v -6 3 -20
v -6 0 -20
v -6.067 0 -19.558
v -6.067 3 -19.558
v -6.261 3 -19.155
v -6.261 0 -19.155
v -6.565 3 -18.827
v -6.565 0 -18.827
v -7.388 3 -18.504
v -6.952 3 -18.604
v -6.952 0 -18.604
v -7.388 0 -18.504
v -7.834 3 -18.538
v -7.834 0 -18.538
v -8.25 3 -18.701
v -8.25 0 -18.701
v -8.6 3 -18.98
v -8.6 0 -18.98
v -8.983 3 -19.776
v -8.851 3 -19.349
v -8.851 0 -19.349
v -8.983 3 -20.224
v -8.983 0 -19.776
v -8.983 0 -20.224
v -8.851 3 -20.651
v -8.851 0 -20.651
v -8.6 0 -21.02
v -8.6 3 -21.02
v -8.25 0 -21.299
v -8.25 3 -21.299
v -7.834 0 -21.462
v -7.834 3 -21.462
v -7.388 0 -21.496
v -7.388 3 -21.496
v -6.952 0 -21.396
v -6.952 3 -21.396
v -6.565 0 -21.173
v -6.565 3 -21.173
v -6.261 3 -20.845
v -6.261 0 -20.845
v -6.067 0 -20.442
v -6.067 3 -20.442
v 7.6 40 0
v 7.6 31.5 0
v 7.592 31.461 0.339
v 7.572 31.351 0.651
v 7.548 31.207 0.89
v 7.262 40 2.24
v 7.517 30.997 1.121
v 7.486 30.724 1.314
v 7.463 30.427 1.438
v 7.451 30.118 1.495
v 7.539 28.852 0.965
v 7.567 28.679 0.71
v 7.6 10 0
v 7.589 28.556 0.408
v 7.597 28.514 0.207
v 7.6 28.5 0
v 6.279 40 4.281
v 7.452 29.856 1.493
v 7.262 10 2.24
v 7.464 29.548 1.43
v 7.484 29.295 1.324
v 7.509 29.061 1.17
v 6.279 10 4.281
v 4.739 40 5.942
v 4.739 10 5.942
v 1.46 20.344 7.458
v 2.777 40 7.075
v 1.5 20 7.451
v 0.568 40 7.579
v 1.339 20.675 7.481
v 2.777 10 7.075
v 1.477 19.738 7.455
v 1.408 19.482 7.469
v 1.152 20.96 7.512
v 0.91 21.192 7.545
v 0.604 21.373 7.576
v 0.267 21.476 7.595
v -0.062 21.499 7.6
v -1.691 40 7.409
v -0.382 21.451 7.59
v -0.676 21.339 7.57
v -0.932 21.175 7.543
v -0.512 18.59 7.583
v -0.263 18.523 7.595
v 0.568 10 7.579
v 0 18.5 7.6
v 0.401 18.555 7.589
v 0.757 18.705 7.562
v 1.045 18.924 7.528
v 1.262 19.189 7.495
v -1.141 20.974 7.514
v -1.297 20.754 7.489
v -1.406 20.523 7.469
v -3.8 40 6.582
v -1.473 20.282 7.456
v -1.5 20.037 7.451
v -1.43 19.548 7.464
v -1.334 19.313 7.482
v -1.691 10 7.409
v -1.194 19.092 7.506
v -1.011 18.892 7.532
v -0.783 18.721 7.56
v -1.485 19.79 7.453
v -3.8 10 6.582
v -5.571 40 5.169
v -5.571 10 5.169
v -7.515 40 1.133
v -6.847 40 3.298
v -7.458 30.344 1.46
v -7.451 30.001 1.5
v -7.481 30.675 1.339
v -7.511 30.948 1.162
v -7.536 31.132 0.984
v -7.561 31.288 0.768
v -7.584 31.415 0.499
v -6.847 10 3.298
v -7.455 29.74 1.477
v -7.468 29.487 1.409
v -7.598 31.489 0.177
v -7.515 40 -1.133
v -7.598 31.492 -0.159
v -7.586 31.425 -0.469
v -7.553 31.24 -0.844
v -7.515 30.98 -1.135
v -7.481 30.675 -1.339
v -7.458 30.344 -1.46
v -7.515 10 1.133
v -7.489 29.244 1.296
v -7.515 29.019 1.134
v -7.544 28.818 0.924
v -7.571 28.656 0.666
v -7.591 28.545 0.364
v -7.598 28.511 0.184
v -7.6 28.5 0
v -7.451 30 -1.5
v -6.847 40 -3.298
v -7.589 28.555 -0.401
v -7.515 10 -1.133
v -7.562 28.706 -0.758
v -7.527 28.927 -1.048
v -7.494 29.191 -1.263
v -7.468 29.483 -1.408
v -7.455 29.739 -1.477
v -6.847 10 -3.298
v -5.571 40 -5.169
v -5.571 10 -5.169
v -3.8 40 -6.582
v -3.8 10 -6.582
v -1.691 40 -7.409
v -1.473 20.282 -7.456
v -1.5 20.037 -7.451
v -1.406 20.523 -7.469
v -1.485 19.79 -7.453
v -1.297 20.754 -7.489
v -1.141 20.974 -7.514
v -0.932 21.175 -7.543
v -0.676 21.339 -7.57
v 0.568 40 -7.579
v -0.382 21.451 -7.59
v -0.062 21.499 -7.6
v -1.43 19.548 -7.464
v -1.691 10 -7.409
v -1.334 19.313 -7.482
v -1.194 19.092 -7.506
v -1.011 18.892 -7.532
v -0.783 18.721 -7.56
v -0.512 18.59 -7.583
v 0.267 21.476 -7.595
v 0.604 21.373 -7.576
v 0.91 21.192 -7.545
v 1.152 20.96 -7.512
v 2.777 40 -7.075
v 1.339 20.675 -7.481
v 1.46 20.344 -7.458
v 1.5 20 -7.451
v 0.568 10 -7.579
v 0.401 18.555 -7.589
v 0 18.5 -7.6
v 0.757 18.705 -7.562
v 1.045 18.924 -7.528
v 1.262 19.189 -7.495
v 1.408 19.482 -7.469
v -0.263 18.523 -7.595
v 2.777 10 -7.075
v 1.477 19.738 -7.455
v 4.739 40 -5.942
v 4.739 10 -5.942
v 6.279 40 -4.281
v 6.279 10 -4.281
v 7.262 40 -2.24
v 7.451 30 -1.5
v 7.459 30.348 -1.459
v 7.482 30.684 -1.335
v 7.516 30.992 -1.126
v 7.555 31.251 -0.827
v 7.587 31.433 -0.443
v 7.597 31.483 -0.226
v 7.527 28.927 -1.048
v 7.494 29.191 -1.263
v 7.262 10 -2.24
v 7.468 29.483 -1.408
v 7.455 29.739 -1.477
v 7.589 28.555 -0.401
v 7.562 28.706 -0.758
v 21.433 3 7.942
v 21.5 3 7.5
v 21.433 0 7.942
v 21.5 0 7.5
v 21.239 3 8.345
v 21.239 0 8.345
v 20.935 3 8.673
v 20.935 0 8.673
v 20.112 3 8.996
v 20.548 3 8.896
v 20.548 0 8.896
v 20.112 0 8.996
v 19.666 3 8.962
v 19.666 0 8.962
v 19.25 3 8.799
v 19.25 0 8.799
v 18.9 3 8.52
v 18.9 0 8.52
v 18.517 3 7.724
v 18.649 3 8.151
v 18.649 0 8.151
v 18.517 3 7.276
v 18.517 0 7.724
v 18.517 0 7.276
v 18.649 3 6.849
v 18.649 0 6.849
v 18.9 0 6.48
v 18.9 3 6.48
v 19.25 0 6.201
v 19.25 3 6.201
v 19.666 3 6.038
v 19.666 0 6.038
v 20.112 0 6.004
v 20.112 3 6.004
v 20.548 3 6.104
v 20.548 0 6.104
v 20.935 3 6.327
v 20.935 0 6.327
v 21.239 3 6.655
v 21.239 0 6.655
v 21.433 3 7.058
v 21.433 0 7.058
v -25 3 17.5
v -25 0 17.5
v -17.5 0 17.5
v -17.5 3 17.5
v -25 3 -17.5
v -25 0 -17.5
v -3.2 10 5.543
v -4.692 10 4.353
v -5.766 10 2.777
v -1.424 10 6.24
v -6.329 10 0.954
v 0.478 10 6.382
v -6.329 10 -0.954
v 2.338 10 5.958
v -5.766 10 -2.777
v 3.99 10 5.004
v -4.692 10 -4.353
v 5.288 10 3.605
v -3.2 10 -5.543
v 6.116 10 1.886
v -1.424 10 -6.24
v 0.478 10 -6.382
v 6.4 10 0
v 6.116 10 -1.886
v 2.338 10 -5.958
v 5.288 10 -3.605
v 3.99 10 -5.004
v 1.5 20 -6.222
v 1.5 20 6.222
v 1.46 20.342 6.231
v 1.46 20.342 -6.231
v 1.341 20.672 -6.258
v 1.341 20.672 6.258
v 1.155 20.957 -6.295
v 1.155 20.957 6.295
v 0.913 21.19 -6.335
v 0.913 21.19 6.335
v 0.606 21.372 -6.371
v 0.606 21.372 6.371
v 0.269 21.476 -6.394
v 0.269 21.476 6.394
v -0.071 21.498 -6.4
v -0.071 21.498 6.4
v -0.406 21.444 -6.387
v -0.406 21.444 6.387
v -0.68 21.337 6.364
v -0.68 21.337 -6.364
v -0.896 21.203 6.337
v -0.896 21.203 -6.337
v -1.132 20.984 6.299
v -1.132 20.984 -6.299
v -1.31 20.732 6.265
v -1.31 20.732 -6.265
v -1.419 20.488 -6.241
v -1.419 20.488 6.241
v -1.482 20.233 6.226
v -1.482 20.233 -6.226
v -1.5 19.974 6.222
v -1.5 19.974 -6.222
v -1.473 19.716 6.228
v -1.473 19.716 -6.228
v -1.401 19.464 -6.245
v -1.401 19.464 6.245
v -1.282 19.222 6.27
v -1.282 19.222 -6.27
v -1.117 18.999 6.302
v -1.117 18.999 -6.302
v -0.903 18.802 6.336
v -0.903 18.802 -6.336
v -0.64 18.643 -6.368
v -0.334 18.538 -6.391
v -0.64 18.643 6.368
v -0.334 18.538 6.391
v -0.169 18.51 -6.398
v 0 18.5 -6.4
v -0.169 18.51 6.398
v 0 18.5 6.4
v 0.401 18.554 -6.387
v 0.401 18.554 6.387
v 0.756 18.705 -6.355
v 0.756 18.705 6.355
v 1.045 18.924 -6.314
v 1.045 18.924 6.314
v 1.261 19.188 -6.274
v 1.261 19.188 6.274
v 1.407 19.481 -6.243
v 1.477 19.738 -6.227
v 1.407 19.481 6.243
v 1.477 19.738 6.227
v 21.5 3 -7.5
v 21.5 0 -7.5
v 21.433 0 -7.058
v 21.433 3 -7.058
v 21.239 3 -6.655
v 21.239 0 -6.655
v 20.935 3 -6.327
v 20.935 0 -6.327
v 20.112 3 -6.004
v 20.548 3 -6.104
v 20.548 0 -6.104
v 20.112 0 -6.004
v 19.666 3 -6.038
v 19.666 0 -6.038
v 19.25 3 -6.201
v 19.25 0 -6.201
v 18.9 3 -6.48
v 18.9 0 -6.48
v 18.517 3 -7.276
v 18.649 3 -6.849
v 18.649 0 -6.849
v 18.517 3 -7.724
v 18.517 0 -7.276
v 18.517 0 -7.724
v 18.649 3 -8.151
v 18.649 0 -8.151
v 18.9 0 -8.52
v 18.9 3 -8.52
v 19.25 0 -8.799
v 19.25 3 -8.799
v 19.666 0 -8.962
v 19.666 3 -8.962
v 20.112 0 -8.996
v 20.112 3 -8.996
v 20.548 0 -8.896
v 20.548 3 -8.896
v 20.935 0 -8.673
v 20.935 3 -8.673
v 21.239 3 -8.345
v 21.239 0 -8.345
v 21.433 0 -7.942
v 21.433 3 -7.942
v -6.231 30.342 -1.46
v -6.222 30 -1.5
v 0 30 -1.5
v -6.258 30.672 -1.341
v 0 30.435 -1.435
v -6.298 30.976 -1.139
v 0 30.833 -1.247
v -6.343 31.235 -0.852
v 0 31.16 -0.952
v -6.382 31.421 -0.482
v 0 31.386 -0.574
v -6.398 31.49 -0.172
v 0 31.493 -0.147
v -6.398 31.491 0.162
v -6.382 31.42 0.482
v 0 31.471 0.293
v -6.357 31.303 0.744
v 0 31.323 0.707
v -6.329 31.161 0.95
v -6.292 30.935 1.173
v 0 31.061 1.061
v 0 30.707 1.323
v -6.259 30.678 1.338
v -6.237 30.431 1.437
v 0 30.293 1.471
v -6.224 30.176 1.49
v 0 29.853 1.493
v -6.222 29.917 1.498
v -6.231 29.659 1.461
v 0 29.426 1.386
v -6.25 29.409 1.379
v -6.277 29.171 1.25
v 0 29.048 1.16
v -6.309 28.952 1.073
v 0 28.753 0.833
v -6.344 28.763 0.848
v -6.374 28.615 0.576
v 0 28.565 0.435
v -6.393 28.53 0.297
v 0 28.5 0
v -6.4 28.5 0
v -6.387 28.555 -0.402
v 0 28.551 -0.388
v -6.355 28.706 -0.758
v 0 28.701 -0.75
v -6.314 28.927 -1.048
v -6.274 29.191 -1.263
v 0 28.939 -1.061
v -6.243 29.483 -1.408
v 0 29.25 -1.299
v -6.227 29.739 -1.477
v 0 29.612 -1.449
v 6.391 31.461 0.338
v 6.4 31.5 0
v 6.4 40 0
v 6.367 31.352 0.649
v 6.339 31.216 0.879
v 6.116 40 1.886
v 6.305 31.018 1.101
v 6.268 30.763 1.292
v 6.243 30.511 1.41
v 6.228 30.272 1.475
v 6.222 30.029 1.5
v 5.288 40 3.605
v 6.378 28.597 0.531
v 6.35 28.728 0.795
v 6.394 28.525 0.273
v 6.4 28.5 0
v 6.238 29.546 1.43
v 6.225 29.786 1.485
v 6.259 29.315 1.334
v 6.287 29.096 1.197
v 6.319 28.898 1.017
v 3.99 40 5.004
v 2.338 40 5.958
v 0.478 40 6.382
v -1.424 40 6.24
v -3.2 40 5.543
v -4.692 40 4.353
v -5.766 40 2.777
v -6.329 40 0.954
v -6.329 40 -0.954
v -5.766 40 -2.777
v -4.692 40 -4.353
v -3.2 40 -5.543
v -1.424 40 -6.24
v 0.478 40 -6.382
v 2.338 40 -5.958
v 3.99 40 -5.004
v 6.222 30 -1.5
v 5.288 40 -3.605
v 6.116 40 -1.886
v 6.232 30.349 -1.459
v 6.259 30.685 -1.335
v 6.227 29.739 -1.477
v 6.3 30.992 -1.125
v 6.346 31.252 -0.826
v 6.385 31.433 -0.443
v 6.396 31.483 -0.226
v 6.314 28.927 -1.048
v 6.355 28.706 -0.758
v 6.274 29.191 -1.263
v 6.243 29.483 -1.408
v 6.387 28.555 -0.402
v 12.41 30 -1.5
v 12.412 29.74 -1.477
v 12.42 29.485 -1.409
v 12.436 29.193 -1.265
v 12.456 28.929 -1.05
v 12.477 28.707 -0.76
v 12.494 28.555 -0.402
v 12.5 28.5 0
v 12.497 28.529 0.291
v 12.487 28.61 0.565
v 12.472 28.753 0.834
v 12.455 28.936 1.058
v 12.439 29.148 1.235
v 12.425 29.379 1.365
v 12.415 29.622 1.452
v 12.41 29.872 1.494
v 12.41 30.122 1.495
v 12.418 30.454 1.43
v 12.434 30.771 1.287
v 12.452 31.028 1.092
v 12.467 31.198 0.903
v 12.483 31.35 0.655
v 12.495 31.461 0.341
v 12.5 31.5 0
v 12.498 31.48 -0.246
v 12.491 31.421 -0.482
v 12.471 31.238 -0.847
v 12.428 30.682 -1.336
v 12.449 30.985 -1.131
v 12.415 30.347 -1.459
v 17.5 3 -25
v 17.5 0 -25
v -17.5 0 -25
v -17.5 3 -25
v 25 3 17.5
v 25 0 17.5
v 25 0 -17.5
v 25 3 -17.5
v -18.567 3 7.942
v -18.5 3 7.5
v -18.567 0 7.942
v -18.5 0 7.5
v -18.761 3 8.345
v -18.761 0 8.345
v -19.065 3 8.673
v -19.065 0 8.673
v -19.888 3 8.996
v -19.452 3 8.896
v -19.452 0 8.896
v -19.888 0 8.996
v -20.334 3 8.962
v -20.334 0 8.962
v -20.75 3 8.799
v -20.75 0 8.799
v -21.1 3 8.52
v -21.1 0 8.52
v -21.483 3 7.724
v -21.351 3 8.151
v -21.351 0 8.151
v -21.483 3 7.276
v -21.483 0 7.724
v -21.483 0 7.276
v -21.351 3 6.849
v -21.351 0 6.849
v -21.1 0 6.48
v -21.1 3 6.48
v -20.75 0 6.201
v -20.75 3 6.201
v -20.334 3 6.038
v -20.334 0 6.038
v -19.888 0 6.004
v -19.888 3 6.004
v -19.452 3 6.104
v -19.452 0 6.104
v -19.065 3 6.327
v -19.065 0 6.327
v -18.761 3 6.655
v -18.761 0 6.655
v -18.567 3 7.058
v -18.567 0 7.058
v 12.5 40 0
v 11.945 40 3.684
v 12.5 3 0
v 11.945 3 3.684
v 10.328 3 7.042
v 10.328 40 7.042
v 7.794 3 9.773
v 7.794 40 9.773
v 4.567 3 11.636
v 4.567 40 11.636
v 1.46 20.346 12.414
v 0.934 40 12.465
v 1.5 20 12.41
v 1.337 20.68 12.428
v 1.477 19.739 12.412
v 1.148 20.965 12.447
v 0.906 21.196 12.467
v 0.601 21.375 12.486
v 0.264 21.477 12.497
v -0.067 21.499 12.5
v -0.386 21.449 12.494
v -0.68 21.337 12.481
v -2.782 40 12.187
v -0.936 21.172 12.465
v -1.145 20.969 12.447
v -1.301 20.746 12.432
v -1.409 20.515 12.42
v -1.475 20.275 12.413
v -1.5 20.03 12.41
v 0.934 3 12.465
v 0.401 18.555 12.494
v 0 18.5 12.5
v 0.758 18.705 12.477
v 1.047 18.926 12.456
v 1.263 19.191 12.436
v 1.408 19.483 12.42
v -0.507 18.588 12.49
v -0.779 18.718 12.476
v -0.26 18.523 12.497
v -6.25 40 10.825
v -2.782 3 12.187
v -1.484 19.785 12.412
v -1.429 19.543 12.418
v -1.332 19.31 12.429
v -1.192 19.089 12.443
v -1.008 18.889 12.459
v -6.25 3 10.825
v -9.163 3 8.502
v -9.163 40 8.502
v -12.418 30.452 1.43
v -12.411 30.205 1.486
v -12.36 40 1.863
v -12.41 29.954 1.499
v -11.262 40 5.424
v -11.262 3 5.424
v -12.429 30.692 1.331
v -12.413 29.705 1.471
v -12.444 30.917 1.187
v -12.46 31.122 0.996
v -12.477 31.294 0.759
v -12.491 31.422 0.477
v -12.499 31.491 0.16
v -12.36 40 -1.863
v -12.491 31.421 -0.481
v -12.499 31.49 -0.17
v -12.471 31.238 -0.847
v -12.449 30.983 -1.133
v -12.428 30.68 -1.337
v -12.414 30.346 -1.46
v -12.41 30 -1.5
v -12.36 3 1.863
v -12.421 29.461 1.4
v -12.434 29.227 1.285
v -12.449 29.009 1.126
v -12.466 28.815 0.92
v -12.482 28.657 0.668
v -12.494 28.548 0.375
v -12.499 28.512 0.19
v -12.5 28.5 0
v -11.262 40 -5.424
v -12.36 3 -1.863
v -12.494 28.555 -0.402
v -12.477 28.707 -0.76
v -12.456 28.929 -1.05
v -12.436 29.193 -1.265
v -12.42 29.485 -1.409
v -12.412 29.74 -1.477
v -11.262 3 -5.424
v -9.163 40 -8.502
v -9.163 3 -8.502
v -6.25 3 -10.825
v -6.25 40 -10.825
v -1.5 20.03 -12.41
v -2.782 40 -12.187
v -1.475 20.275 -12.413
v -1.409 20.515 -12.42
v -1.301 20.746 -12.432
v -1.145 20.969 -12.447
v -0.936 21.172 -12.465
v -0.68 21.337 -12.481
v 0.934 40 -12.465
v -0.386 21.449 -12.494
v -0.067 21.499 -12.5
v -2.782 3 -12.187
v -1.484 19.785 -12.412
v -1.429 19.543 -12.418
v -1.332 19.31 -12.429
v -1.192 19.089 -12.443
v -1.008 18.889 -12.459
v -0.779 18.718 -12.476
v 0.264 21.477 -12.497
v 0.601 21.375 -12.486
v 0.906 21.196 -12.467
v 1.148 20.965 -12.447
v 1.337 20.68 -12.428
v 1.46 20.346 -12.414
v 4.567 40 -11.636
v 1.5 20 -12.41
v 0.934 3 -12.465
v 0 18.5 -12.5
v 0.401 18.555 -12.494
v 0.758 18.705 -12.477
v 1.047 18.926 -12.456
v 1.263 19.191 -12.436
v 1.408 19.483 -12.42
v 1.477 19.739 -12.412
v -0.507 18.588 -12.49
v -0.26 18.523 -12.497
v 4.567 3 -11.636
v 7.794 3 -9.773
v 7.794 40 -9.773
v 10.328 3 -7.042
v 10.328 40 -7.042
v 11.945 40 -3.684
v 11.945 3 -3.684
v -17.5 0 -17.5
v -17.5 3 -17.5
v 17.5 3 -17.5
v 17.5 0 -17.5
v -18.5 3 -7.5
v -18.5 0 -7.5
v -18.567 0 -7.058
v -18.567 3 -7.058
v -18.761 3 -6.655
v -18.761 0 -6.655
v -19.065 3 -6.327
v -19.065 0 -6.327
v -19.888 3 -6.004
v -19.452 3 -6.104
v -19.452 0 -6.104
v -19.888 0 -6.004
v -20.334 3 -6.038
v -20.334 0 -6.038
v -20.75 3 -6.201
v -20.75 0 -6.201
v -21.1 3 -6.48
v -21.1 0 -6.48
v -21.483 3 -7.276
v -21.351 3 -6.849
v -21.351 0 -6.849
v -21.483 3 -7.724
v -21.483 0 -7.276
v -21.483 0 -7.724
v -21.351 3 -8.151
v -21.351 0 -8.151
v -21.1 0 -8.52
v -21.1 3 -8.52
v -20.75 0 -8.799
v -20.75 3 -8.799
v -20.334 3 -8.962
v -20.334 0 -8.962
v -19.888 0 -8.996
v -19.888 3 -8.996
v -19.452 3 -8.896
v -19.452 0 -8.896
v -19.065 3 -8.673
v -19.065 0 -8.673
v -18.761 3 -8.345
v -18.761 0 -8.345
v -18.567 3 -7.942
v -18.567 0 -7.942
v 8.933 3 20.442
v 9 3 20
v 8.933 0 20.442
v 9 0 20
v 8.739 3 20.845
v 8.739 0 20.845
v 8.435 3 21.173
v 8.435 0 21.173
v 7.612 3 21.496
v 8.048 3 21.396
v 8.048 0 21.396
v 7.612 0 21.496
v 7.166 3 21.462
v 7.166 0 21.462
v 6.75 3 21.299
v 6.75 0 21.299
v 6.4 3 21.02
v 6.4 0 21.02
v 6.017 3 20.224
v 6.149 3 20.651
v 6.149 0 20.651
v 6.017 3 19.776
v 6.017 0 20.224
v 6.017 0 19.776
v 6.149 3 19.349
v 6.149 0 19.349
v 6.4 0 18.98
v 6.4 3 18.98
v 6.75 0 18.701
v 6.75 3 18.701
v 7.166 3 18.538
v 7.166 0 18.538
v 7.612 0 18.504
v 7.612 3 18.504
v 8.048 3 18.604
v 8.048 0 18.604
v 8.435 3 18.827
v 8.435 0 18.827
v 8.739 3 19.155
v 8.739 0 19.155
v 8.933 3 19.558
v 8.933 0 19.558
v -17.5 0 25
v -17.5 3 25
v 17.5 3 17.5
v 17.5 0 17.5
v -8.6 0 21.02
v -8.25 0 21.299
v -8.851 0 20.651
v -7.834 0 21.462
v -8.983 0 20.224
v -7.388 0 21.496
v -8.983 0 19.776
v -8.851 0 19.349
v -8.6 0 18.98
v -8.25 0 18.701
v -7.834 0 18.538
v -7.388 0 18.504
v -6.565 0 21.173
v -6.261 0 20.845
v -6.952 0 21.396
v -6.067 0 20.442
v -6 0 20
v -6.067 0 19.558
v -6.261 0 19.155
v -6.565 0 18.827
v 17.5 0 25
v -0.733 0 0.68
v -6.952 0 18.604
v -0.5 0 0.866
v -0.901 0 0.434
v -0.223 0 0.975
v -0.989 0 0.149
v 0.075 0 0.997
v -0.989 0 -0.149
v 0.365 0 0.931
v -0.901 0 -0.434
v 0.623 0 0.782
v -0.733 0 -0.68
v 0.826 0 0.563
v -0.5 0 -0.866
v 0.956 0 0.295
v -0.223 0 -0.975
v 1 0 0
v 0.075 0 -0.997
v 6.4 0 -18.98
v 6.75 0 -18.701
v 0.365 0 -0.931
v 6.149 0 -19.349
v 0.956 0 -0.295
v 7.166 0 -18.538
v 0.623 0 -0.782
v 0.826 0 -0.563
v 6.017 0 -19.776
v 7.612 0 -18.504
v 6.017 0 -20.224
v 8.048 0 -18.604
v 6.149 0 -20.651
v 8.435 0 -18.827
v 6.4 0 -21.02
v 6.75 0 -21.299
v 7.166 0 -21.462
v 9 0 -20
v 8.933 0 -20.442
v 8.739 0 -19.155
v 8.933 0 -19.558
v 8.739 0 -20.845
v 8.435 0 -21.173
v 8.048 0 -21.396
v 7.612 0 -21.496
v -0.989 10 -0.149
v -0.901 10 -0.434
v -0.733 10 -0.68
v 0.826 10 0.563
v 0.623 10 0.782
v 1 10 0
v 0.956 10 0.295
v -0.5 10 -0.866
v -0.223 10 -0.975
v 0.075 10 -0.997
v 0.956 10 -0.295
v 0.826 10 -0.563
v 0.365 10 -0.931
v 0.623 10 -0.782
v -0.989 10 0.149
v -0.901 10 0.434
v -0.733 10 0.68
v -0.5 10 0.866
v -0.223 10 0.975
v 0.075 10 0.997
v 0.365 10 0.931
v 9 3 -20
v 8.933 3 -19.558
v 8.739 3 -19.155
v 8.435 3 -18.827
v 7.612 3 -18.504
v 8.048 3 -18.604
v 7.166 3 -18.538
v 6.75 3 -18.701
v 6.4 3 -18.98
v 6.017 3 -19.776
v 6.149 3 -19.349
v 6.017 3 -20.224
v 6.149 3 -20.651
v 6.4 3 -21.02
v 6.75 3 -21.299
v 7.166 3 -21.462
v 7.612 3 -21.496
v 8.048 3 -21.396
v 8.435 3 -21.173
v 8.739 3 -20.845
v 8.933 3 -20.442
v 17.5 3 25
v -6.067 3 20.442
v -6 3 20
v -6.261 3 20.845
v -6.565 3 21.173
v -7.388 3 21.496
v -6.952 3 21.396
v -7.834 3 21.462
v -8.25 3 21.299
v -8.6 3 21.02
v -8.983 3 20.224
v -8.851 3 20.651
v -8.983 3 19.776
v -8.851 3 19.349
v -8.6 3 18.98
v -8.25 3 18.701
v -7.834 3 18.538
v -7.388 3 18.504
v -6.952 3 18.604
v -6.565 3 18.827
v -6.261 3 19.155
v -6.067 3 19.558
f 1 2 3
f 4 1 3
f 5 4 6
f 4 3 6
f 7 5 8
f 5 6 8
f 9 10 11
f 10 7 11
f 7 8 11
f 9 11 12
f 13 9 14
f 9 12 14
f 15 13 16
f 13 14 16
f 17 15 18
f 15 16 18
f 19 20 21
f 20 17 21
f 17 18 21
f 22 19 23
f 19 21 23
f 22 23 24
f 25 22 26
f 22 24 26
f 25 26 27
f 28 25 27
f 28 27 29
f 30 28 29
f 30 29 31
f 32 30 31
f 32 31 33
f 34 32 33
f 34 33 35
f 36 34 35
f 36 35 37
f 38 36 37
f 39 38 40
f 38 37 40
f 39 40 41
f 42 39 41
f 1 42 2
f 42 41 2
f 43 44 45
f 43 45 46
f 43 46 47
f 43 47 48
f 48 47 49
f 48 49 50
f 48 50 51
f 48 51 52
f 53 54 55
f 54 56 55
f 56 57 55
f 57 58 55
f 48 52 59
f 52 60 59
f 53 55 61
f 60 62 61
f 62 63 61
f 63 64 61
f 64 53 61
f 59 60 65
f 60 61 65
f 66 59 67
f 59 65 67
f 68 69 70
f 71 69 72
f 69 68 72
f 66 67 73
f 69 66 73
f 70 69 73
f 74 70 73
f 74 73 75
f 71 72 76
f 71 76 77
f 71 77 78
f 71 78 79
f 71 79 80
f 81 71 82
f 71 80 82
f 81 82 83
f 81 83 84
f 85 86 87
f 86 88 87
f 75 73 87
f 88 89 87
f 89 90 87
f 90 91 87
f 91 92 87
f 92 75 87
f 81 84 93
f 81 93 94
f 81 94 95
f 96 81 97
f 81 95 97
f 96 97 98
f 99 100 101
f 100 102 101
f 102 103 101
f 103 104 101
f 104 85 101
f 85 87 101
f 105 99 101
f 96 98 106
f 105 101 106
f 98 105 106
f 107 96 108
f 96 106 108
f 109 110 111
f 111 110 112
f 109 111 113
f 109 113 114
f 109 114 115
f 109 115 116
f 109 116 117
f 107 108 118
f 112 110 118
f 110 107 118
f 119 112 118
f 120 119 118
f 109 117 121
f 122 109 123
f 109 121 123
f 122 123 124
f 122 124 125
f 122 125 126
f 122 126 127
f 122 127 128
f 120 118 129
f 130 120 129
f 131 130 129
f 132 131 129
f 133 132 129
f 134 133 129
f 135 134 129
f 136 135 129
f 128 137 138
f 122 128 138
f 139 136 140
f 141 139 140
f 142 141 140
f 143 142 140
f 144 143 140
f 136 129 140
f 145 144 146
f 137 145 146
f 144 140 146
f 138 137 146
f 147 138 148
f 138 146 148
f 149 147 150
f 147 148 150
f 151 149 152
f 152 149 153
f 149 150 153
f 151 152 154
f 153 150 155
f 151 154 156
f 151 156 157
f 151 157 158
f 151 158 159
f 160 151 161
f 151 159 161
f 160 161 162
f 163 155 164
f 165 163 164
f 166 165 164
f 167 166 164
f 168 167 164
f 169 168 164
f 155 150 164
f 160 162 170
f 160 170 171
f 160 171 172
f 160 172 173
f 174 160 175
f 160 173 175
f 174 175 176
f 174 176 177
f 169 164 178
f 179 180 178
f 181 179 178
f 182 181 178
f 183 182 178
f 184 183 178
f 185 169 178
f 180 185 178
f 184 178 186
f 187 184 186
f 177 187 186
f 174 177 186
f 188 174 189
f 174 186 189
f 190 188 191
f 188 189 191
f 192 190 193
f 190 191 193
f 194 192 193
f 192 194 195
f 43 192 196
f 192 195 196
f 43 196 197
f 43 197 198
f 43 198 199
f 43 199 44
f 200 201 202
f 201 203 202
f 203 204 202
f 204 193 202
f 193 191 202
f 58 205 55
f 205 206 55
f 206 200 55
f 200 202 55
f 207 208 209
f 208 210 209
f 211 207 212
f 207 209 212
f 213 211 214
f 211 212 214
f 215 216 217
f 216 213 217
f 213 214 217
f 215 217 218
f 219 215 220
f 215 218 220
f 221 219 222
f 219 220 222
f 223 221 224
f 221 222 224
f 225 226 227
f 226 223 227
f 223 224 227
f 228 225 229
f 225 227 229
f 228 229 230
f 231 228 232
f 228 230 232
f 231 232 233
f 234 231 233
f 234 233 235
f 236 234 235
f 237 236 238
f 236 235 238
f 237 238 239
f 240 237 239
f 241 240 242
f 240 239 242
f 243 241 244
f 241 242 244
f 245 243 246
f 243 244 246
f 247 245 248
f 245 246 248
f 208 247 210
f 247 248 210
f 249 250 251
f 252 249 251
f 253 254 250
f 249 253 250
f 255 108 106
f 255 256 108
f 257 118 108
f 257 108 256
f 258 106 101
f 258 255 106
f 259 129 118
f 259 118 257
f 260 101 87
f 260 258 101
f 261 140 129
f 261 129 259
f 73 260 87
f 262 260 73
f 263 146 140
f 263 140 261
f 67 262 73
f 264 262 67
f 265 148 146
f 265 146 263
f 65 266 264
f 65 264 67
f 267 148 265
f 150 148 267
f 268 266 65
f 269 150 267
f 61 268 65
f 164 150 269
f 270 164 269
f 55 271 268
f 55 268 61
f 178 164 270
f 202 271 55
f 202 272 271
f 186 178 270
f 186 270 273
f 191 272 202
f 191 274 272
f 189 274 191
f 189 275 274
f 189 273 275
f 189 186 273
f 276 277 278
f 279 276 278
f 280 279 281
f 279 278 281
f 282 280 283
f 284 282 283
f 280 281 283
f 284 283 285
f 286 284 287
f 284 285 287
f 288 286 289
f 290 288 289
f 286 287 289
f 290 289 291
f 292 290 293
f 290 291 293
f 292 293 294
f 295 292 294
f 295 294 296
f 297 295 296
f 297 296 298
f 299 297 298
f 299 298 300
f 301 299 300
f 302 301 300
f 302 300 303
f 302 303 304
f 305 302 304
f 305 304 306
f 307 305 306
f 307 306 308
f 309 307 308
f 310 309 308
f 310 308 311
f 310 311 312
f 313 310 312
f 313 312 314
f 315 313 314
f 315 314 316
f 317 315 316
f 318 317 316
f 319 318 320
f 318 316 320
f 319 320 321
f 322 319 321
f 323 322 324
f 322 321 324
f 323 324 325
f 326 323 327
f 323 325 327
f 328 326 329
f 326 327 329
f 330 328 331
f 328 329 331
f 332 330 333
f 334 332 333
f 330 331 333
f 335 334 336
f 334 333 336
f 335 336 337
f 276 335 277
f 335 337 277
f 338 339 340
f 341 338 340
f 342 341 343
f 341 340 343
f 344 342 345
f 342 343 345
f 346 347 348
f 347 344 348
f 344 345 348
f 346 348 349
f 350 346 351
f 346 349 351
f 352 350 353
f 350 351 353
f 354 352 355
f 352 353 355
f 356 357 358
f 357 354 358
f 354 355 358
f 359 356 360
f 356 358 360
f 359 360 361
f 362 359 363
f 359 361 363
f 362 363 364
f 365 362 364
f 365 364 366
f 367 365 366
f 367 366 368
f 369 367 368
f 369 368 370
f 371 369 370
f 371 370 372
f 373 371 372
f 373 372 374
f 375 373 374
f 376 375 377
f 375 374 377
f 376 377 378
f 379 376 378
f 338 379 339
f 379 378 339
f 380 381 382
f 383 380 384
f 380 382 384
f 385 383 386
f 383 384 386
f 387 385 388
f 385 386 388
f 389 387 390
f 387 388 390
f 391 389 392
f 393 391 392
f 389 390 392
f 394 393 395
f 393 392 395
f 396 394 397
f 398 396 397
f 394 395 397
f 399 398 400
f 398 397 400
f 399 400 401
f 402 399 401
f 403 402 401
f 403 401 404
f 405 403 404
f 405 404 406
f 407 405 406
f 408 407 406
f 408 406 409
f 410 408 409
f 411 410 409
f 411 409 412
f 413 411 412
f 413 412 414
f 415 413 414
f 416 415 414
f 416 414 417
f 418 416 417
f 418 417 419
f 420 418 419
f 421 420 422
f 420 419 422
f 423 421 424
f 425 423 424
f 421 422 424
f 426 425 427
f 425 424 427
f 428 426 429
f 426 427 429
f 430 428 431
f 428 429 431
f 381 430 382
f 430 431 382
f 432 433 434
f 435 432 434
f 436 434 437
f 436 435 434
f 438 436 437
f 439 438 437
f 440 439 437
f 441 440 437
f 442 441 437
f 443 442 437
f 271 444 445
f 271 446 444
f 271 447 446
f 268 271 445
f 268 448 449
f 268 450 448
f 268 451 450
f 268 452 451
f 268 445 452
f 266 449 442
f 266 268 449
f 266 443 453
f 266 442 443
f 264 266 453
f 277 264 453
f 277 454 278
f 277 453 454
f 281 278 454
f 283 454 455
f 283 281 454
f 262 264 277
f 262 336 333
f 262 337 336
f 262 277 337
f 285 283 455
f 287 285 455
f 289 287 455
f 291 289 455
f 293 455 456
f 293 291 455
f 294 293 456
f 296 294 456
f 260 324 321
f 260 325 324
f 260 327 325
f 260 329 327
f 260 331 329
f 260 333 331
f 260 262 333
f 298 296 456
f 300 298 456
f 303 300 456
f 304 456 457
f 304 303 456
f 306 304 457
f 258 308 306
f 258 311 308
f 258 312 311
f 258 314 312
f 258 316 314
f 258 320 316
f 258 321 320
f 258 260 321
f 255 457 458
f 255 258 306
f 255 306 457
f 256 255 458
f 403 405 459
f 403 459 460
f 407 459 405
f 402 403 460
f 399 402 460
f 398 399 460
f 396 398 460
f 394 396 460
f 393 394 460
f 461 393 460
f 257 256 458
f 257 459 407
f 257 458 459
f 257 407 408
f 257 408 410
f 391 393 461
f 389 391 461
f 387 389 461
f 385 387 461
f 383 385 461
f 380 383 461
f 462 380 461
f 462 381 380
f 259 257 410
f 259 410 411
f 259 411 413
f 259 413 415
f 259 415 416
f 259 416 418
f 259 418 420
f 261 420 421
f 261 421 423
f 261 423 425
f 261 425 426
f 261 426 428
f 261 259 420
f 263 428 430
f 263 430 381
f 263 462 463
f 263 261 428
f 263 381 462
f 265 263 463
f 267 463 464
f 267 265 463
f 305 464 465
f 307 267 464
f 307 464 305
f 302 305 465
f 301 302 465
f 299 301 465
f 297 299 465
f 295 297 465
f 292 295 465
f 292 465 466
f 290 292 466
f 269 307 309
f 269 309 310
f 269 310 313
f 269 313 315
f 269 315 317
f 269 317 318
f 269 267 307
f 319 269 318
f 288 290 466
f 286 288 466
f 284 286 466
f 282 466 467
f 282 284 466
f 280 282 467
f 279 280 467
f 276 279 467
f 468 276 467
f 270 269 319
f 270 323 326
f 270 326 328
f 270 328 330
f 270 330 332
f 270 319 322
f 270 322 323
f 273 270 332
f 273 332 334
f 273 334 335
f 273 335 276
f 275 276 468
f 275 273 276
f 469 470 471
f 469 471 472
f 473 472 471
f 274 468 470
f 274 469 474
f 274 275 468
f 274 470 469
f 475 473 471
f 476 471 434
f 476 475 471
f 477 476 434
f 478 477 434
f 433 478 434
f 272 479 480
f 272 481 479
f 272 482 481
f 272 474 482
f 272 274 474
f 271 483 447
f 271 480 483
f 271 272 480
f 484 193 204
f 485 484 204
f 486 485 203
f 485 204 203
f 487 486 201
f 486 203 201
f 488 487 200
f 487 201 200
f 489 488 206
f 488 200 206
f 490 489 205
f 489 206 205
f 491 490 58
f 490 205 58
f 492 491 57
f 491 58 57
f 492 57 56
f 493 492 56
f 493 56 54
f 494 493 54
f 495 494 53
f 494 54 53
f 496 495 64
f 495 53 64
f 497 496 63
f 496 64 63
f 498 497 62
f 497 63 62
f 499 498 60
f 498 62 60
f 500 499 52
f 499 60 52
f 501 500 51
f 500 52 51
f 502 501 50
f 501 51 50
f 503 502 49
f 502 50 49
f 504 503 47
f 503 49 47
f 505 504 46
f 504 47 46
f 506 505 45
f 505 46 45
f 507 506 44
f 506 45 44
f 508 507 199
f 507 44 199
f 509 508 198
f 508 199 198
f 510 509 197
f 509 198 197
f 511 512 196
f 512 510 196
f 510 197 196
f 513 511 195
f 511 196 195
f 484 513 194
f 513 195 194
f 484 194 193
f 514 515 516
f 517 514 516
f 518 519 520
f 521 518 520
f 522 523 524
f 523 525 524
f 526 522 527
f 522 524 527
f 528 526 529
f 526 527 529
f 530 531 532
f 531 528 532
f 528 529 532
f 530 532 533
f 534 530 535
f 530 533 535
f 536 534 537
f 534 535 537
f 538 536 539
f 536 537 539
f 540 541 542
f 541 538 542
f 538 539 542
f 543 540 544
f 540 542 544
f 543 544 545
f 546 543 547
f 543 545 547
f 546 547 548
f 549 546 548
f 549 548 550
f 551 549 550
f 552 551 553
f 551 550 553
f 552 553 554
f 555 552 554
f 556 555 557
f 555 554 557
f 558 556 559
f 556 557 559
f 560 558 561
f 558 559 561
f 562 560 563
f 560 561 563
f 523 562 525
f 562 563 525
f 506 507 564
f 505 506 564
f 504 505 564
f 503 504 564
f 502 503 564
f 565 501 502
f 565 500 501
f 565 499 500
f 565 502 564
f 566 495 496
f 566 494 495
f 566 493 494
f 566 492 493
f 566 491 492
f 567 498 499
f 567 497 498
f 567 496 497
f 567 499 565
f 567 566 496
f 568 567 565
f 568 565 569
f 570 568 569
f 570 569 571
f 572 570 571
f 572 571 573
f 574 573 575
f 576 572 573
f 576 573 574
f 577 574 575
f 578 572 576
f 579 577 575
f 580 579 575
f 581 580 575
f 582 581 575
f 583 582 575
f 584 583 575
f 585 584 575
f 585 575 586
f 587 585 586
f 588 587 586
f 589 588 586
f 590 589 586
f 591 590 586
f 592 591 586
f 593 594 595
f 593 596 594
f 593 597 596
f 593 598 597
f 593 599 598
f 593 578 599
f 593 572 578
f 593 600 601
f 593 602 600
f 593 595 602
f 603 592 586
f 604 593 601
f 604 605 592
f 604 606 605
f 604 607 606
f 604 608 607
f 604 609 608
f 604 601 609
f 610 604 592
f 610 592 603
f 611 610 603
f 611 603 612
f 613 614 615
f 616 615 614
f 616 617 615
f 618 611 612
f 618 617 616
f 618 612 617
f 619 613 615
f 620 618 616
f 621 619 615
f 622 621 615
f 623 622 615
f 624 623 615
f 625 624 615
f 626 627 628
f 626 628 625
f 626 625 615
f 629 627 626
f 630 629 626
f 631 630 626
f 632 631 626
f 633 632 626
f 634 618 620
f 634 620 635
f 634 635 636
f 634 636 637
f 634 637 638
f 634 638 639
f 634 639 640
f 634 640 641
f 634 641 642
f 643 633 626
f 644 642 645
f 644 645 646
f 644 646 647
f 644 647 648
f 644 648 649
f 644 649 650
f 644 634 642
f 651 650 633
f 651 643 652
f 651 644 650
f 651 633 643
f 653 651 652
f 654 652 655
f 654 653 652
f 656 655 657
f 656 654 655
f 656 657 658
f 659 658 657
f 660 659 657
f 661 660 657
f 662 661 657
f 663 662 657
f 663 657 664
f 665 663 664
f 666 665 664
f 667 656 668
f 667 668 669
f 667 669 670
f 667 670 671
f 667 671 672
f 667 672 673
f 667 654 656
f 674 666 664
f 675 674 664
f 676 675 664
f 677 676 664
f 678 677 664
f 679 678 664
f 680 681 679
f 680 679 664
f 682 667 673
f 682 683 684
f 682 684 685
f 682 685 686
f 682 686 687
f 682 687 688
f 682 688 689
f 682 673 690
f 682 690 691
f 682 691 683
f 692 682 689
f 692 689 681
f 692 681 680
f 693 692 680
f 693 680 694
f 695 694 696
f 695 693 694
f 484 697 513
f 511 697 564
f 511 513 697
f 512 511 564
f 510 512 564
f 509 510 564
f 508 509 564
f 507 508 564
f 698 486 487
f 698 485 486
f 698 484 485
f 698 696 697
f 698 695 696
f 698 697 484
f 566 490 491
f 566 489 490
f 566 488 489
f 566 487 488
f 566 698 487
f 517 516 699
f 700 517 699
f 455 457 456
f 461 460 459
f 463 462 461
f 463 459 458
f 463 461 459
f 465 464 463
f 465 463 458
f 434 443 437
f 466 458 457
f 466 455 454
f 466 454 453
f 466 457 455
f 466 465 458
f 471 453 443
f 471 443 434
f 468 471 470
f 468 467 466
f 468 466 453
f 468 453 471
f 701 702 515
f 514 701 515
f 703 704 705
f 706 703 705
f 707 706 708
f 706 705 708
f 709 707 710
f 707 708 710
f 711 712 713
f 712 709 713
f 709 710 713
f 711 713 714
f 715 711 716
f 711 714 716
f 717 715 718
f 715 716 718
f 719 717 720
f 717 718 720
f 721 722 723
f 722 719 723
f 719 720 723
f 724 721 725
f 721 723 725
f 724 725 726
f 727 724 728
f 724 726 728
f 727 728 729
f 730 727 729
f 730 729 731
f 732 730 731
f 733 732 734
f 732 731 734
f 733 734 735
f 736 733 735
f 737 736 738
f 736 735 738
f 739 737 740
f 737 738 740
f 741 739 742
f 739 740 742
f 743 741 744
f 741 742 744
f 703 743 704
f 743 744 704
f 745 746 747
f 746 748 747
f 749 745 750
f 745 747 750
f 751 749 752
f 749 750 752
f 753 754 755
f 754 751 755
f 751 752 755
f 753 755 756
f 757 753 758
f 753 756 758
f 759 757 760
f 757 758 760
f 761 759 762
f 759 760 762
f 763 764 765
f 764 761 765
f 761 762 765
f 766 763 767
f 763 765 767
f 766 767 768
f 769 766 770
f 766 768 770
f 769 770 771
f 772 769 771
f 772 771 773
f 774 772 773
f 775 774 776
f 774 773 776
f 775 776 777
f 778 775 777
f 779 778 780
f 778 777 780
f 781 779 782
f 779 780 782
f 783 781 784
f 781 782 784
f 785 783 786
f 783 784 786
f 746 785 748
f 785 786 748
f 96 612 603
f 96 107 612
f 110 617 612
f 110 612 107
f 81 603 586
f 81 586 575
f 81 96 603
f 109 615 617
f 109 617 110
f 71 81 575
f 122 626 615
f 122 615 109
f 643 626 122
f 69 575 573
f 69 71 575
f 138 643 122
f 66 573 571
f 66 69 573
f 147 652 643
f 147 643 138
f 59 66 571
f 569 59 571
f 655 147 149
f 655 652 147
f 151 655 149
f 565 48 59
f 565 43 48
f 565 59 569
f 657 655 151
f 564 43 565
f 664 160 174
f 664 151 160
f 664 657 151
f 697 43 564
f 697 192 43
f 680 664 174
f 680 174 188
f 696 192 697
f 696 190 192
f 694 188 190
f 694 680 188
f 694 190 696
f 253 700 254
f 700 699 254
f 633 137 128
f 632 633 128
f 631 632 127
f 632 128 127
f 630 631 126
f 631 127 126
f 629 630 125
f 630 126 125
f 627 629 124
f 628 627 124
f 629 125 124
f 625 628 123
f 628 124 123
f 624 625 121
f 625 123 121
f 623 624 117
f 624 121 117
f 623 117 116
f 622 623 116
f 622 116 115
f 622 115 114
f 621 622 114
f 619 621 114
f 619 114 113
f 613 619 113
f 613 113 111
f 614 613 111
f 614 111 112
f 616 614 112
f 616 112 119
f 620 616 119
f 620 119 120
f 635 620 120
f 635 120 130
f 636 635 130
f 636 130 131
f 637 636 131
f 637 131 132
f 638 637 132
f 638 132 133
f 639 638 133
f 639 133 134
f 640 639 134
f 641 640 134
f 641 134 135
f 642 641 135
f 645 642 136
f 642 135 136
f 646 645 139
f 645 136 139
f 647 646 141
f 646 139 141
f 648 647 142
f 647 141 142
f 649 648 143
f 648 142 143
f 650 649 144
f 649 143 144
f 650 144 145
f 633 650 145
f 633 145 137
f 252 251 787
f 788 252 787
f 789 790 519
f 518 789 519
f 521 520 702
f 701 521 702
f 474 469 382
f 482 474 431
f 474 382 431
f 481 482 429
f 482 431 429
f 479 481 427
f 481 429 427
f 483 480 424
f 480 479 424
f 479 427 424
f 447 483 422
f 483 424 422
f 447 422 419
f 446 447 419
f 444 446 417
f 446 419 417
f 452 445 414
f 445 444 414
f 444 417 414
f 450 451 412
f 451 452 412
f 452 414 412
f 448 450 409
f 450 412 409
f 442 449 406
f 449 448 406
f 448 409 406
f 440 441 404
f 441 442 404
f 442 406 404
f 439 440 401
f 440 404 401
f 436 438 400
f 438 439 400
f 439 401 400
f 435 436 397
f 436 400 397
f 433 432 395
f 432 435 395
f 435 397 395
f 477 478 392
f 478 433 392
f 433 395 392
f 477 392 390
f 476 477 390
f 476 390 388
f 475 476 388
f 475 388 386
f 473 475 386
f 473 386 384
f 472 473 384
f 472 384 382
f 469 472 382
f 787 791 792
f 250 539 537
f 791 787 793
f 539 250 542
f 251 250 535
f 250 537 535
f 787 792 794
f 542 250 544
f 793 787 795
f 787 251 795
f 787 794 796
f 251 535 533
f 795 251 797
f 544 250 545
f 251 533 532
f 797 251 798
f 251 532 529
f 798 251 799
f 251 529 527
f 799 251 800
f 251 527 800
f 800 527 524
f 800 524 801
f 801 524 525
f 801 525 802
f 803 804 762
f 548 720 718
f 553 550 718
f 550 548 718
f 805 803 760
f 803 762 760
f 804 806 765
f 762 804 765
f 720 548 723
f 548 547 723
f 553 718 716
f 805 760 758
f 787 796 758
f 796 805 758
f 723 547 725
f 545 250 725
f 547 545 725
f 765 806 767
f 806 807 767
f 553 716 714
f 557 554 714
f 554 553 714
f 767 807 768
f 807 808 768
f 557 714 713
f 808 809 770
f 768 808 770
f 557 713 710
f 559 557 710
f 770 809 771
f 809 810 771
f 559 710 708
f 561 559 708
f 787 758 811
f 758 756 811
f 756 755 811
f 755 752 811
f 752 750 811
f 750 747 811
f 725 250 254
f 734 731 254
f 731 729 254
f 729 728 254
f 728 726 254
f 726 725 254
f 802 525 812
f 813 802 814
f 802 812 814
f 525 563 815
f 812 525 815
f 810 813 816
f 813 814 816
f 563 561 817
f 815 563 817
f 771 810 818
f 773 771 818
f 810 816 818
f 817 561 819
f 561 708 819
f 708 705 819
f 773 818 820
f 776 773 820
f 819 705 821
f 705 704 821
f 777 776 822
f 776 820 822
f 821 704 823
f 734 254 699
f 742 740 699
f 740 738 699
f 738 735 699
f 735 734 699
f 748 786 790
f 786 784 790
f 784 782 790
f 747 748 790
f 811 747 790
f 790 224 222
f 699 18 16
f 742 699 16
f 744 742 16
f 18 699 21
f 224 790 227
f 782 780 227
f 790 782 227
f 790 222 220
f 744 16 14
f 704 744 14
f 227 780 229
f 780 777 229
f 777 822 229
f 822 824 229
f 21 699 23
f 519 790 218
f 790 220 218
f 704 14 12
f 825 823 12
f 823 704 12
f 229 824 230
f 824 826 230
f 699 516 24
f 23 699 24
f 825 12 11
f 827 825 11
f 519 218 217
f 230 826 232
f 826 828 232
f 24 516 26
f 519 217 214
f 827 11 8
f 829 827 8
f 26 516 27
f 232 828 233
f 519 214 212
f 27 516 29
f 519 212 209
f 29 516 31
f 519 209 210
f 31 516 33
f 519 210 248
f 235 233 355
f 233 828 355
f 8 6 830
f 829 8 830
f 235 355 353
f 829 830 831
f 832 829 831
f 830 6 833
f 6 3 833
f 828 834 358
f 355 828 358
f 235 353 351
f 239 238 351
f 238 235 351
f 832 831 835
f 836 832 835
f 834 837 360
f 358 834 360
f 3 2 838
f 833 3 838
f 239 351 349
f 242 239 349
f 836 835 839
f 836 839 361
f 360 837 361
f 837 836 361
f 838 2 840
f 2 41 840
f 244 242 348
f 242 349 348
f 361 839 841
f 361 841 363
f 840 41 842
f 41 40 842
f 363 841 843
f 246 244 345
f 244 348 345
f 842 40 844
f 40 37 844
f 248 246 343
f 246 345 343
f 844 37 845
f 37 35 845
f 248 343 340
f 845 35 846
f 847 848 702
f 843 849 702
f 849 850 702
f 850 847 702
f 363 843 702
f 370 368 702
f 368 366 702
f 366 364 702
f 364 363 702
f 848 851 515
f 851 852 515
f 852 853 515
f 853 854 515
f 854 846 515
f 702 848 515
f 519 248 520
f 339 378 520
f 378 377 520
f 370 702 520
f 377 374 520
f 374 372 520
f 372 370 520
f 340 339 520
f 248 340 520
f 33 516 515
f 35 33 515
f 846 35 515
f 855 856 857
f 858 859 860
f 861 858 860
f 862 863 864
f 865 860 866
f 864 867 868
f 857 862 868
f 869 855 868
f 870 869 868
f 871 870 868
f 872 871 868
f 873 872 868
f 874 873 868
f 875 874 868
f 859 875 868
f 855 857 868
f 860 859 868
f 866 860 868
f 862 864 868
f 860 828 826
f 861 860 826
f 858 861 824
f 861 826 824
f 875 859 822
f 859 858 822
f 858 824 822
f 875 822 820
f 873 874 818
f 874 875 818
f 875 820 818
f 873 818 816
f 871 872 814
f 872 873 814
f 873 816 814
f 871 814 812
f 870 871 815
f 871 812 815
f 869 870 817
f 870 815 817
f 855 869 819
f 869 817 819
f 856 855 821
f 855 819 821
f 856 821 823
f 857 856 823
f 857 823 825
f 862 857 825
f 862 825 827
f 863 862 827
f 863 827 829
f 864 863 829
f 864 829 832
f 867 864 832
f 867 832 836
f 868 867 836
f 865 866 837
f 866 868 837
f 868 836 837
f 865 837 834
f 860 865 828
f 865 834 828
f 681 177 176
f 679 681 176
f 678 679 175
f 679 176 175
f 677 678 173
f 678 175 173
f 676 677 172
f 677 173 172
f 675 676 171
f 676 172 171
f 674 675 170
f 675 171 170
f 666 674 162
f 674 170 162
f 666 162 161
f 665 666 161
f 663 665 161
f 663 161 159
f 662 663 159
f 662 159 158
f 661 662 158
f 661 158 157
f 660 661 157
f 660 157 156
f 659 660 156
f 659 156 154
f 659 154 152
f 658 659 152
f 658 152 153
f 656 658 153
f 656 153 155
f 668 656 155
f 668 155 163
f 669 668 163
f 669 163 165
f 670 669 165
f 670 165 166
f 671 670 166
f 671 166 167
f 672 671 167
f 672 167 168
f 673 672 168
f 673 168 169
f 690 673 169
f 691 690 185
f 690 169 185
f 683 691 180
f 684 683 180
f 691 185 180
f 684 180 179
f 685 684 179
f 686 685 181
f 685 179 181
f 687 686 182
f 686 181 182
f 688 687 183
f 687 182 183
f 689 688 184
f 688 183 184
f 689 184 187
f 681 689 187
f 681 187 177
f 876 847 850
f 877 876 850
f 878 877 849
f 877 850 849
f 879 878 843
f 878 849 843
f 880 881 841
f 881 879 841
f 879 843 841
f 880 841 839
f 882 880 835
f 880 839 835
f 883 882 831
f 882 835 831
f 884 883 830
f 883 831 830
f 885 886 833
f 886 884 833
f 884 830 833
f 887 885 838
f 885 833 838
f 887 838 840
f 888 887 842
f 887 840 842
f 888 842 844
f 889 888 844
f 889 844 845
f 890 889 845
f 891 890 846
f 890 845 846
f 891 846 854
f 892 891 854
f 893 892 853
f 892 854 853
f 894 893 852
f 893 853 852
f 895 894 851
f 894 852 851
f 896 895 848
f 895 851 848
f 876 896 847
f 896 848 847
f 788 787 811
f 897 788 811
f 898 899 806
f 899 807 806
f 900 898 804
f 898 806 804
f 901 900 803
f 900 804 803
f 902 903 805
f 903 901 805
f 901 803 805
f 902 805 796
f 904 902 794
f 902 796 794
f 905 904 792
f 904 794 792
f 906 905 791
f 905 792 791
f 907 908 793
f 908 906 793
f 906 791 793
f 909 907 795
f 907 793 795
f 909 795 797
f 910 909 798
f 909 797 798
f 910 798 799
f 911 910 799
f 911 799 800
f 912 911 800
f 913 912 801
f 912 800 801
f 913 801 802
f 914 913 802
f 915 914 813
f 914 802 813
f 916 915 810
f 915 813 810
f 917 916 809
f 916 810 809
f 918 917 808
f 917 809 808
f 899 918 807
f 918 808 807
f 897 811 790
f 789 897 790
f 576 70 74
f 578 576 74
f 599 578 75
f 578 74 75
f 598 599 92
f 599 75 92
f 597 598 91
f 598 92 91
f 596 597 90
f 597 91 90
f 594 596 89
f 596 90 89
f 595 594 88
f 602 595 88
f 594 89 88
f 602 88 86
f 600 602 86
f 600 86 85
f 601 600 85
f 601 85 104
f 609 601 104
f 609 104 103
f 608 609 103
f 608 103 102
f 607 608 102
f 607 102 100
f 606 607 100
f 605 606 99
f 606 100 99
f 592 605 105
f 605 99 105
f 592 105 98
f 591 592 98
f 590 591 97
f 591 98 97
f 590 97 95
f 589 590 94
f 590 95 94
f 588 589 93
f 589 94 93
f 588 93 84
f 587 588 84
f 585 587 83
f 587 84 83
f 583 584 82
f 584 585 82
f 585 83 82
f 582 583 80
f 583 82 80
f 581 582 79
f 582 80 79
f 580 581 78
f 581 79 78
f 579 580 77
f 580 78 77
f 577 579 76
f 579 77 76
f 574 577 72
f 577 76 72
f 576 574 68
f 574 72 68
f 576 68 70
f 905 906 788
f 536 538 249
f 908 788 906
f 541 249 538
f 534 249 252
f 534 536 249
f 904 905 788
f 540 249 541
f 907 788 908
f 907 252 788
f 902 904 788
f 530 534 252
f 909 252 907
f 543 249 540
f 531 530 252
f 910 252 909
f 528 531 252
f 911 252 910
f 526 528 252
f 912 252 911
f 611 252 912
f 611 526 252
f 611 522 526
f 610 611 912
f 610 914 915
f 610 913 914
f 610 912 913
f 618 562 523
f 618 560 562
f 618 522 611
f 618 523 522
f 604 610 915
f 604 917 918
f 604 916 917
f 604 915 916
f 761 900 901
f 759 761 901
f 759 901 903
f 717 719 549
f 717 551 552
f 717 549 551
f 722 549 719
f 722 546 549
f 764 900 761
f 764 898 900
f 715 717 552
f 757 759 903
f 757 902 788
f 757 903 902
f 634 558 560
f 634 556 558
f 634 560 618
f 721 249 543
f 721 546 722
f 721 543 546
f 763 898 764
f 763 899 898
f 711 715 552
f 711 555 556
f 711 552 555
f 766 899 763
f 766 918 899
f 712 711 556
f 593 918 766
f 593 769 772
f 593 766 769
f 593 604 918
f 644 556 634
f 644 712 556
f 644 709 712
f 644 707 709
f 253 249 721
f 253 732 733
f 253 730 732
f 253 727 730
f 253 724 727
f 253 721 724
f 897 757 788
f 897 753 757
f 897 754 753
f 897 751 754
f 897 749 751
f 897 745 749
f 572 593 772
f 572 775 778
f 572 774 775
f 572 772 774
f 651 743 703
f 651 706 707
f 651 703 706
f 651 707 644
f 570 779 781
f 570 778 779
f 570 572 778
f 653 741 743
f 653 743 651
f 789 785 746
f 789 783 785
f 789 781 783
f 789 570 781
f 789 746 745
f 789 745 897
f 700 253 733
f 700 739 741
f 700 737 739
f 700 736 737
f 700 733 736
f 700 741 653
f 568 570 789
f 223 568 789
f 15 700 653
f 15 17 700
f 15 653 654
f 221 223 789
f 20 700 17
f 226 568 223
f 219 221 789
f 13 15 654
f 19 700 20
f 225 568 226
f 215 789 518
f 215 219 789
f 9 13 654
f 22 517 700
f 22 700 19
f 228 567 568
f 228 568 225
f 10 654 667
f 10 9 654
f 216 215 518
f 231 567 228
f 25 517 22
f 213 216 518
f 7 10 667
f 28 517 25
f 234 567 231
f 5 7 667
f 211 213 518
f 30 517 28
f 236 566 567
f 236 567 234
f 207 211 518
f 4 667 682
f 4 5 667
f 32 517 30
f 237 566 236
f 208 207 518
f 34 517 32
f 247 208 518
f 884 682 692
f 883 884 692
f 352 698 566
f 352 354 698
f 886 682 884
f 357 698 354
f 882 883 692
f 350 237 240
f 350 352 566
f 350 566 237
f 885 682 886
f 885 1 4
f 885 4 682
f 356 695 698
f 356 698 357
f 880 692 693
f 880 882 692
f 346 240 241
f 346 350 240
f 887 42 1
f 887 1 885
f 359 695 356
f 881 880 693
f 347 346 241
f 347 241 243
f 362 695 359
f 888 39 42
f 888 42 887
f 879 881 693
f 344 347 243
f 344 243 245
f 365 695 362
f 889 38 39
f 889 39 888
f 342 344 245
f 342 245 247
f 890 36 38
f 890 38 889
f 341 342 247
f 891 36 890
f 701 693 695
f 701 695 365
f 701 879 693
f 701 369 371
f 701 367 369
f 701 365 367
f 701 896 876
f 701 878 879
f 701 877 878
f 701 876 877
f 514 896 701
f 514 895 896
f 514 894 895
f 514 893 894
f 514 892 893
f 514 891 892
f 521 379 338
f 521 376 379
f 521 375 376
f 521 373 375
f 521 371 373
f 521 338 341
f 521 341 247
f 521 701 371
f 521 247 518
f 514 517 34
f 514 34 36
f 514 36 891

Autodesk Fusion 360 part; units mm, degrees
sketch "Sketch1" plane through (0, 0, 0) normal (0, 1, 0) x (1, 0, 0)
  line L0 (17.5, 25) -> (-17.5, 25)
  line L1 (-17.5, 25) -> (-17.5, -25)
  line L2 (-17.5, -25) -> (17.5, -25)
  line L3 (17.5, -25) -> (17.5, 25)
  line L4 (17.5, 25) -> (-17.5, -25) construction
  line L5 (-17.5, 25) -> (17.5, -25) construction
  line L6 (25, 17.5) -> (-25, 17.5)
  line L7 (-25, 17.5) -> (-25, -17.5)
  line L8 (-25, -17.5) -> (25, -17.5)
  line L9 (25, -17.5) -> (25, 17.5)
  line L10 (25, 17.5) -> (-25, -17.5) construction
  line L11 (-25, 17.5) -> (25, -17.5) construction
  circle A0 centre (0, 0) radius 7.6
  circle A1 centre (0, 0) radius 6.4
  circle A2 centre (0, 0) radius 12.5
  circle A3 centre (-20, 7.5) radius 1.5
  circle A4 centre (-20, -7.5) radius 1.5
  circle A5 centre (-7.5, -20) radius 1.5
  circle A6 centre (7.5, -20) radius 1.5
  circle A7 centre (20, -7.5) radius 1.5
  circle A8 centre (20, 7.5) radius 1.5
  circle A9 centre (7.5, 20) radius 1.5
  circle A10 centre (-7.5, 20) radius 1.5
  dimension "d1" = 50
  dimension "d2" = 35
  dimension "d3" = 50
  dimension "d4" = 35
  dimension "d5" = 15.2
  dimension "d6" = 12.8
  dimension "d7" = 25
  dimension "d8" = 3
  dimension "d9" = 3
  dimension "d10" = 10
  dimension "d11" = 10
  dimension "d12" = 5
  dimension "d13" = 5
  dimension "d15" = 360
extrude "Extrude1" add sketch "Sketch1" along normal blind 3 contours L0 L1 L3 L6 | L3 L6 L8 L9 | L1 L3 L6 L8 | L1 L6 L7 L8 | L1 L2 L3 L8 makes body 1
extrude "Extrude2" add sketch "Sketch1" along normal blind 10 separate body contours A0 makes body 2
extrude "Extrude3" add sketch "Sketch1" along normal blind 40 contours A1 | A2 bodies 1 2
sketch "Sketch2" plane through (0, 10, 0) normal (0, 1, 0) x (-1, 0, 0)
  circle A0 centre (0, 0) radius 6.4
  circle A1 centre (0, 0) radius 7.6
sketch "Sketch4" plane through (0, 0, 0) normal (0, 0, 1) x (1, 0, 0)
  circle A0 centre (0, 20) radius 1.5
  line L0 (0, 20) -> (0, 0)
  dimension "d22" = 3
  dimension "d23" = 20
extrude "Extrude4" cut sketch "Sketch4" against normal blind 30 bodies 1
extrude "Extrude5" cut sketch "Sketch4" along normal blind 30 bodies 1
sketch "Sketch6" plane through (0, 0, 0) normal (1, 0, 0) x (0, 0, -1)
  circle A0 centre (0, 30) radius 1.5
  line L0 (0, 30) -> (0, 0)
  dimension "d28" = 3
  dimension "d29" = 30
extrude "Extrude6" cut sketch "Sketch6" against normal blind 30 bodies 1
extrude "Extrude7" cut sketch "Sketch6" along normal blind 30 bodies 1
sketch "Sketch7" plane through (0, 0, 0) normal (0, 1, 0) x (1, 0, 0)
  circle A0 centre (0, 0) radius 1
  dimension "d34" = 2
extrude "Extrude8" cut sketch "Sketch7" along normal blind 10 bodies 1
